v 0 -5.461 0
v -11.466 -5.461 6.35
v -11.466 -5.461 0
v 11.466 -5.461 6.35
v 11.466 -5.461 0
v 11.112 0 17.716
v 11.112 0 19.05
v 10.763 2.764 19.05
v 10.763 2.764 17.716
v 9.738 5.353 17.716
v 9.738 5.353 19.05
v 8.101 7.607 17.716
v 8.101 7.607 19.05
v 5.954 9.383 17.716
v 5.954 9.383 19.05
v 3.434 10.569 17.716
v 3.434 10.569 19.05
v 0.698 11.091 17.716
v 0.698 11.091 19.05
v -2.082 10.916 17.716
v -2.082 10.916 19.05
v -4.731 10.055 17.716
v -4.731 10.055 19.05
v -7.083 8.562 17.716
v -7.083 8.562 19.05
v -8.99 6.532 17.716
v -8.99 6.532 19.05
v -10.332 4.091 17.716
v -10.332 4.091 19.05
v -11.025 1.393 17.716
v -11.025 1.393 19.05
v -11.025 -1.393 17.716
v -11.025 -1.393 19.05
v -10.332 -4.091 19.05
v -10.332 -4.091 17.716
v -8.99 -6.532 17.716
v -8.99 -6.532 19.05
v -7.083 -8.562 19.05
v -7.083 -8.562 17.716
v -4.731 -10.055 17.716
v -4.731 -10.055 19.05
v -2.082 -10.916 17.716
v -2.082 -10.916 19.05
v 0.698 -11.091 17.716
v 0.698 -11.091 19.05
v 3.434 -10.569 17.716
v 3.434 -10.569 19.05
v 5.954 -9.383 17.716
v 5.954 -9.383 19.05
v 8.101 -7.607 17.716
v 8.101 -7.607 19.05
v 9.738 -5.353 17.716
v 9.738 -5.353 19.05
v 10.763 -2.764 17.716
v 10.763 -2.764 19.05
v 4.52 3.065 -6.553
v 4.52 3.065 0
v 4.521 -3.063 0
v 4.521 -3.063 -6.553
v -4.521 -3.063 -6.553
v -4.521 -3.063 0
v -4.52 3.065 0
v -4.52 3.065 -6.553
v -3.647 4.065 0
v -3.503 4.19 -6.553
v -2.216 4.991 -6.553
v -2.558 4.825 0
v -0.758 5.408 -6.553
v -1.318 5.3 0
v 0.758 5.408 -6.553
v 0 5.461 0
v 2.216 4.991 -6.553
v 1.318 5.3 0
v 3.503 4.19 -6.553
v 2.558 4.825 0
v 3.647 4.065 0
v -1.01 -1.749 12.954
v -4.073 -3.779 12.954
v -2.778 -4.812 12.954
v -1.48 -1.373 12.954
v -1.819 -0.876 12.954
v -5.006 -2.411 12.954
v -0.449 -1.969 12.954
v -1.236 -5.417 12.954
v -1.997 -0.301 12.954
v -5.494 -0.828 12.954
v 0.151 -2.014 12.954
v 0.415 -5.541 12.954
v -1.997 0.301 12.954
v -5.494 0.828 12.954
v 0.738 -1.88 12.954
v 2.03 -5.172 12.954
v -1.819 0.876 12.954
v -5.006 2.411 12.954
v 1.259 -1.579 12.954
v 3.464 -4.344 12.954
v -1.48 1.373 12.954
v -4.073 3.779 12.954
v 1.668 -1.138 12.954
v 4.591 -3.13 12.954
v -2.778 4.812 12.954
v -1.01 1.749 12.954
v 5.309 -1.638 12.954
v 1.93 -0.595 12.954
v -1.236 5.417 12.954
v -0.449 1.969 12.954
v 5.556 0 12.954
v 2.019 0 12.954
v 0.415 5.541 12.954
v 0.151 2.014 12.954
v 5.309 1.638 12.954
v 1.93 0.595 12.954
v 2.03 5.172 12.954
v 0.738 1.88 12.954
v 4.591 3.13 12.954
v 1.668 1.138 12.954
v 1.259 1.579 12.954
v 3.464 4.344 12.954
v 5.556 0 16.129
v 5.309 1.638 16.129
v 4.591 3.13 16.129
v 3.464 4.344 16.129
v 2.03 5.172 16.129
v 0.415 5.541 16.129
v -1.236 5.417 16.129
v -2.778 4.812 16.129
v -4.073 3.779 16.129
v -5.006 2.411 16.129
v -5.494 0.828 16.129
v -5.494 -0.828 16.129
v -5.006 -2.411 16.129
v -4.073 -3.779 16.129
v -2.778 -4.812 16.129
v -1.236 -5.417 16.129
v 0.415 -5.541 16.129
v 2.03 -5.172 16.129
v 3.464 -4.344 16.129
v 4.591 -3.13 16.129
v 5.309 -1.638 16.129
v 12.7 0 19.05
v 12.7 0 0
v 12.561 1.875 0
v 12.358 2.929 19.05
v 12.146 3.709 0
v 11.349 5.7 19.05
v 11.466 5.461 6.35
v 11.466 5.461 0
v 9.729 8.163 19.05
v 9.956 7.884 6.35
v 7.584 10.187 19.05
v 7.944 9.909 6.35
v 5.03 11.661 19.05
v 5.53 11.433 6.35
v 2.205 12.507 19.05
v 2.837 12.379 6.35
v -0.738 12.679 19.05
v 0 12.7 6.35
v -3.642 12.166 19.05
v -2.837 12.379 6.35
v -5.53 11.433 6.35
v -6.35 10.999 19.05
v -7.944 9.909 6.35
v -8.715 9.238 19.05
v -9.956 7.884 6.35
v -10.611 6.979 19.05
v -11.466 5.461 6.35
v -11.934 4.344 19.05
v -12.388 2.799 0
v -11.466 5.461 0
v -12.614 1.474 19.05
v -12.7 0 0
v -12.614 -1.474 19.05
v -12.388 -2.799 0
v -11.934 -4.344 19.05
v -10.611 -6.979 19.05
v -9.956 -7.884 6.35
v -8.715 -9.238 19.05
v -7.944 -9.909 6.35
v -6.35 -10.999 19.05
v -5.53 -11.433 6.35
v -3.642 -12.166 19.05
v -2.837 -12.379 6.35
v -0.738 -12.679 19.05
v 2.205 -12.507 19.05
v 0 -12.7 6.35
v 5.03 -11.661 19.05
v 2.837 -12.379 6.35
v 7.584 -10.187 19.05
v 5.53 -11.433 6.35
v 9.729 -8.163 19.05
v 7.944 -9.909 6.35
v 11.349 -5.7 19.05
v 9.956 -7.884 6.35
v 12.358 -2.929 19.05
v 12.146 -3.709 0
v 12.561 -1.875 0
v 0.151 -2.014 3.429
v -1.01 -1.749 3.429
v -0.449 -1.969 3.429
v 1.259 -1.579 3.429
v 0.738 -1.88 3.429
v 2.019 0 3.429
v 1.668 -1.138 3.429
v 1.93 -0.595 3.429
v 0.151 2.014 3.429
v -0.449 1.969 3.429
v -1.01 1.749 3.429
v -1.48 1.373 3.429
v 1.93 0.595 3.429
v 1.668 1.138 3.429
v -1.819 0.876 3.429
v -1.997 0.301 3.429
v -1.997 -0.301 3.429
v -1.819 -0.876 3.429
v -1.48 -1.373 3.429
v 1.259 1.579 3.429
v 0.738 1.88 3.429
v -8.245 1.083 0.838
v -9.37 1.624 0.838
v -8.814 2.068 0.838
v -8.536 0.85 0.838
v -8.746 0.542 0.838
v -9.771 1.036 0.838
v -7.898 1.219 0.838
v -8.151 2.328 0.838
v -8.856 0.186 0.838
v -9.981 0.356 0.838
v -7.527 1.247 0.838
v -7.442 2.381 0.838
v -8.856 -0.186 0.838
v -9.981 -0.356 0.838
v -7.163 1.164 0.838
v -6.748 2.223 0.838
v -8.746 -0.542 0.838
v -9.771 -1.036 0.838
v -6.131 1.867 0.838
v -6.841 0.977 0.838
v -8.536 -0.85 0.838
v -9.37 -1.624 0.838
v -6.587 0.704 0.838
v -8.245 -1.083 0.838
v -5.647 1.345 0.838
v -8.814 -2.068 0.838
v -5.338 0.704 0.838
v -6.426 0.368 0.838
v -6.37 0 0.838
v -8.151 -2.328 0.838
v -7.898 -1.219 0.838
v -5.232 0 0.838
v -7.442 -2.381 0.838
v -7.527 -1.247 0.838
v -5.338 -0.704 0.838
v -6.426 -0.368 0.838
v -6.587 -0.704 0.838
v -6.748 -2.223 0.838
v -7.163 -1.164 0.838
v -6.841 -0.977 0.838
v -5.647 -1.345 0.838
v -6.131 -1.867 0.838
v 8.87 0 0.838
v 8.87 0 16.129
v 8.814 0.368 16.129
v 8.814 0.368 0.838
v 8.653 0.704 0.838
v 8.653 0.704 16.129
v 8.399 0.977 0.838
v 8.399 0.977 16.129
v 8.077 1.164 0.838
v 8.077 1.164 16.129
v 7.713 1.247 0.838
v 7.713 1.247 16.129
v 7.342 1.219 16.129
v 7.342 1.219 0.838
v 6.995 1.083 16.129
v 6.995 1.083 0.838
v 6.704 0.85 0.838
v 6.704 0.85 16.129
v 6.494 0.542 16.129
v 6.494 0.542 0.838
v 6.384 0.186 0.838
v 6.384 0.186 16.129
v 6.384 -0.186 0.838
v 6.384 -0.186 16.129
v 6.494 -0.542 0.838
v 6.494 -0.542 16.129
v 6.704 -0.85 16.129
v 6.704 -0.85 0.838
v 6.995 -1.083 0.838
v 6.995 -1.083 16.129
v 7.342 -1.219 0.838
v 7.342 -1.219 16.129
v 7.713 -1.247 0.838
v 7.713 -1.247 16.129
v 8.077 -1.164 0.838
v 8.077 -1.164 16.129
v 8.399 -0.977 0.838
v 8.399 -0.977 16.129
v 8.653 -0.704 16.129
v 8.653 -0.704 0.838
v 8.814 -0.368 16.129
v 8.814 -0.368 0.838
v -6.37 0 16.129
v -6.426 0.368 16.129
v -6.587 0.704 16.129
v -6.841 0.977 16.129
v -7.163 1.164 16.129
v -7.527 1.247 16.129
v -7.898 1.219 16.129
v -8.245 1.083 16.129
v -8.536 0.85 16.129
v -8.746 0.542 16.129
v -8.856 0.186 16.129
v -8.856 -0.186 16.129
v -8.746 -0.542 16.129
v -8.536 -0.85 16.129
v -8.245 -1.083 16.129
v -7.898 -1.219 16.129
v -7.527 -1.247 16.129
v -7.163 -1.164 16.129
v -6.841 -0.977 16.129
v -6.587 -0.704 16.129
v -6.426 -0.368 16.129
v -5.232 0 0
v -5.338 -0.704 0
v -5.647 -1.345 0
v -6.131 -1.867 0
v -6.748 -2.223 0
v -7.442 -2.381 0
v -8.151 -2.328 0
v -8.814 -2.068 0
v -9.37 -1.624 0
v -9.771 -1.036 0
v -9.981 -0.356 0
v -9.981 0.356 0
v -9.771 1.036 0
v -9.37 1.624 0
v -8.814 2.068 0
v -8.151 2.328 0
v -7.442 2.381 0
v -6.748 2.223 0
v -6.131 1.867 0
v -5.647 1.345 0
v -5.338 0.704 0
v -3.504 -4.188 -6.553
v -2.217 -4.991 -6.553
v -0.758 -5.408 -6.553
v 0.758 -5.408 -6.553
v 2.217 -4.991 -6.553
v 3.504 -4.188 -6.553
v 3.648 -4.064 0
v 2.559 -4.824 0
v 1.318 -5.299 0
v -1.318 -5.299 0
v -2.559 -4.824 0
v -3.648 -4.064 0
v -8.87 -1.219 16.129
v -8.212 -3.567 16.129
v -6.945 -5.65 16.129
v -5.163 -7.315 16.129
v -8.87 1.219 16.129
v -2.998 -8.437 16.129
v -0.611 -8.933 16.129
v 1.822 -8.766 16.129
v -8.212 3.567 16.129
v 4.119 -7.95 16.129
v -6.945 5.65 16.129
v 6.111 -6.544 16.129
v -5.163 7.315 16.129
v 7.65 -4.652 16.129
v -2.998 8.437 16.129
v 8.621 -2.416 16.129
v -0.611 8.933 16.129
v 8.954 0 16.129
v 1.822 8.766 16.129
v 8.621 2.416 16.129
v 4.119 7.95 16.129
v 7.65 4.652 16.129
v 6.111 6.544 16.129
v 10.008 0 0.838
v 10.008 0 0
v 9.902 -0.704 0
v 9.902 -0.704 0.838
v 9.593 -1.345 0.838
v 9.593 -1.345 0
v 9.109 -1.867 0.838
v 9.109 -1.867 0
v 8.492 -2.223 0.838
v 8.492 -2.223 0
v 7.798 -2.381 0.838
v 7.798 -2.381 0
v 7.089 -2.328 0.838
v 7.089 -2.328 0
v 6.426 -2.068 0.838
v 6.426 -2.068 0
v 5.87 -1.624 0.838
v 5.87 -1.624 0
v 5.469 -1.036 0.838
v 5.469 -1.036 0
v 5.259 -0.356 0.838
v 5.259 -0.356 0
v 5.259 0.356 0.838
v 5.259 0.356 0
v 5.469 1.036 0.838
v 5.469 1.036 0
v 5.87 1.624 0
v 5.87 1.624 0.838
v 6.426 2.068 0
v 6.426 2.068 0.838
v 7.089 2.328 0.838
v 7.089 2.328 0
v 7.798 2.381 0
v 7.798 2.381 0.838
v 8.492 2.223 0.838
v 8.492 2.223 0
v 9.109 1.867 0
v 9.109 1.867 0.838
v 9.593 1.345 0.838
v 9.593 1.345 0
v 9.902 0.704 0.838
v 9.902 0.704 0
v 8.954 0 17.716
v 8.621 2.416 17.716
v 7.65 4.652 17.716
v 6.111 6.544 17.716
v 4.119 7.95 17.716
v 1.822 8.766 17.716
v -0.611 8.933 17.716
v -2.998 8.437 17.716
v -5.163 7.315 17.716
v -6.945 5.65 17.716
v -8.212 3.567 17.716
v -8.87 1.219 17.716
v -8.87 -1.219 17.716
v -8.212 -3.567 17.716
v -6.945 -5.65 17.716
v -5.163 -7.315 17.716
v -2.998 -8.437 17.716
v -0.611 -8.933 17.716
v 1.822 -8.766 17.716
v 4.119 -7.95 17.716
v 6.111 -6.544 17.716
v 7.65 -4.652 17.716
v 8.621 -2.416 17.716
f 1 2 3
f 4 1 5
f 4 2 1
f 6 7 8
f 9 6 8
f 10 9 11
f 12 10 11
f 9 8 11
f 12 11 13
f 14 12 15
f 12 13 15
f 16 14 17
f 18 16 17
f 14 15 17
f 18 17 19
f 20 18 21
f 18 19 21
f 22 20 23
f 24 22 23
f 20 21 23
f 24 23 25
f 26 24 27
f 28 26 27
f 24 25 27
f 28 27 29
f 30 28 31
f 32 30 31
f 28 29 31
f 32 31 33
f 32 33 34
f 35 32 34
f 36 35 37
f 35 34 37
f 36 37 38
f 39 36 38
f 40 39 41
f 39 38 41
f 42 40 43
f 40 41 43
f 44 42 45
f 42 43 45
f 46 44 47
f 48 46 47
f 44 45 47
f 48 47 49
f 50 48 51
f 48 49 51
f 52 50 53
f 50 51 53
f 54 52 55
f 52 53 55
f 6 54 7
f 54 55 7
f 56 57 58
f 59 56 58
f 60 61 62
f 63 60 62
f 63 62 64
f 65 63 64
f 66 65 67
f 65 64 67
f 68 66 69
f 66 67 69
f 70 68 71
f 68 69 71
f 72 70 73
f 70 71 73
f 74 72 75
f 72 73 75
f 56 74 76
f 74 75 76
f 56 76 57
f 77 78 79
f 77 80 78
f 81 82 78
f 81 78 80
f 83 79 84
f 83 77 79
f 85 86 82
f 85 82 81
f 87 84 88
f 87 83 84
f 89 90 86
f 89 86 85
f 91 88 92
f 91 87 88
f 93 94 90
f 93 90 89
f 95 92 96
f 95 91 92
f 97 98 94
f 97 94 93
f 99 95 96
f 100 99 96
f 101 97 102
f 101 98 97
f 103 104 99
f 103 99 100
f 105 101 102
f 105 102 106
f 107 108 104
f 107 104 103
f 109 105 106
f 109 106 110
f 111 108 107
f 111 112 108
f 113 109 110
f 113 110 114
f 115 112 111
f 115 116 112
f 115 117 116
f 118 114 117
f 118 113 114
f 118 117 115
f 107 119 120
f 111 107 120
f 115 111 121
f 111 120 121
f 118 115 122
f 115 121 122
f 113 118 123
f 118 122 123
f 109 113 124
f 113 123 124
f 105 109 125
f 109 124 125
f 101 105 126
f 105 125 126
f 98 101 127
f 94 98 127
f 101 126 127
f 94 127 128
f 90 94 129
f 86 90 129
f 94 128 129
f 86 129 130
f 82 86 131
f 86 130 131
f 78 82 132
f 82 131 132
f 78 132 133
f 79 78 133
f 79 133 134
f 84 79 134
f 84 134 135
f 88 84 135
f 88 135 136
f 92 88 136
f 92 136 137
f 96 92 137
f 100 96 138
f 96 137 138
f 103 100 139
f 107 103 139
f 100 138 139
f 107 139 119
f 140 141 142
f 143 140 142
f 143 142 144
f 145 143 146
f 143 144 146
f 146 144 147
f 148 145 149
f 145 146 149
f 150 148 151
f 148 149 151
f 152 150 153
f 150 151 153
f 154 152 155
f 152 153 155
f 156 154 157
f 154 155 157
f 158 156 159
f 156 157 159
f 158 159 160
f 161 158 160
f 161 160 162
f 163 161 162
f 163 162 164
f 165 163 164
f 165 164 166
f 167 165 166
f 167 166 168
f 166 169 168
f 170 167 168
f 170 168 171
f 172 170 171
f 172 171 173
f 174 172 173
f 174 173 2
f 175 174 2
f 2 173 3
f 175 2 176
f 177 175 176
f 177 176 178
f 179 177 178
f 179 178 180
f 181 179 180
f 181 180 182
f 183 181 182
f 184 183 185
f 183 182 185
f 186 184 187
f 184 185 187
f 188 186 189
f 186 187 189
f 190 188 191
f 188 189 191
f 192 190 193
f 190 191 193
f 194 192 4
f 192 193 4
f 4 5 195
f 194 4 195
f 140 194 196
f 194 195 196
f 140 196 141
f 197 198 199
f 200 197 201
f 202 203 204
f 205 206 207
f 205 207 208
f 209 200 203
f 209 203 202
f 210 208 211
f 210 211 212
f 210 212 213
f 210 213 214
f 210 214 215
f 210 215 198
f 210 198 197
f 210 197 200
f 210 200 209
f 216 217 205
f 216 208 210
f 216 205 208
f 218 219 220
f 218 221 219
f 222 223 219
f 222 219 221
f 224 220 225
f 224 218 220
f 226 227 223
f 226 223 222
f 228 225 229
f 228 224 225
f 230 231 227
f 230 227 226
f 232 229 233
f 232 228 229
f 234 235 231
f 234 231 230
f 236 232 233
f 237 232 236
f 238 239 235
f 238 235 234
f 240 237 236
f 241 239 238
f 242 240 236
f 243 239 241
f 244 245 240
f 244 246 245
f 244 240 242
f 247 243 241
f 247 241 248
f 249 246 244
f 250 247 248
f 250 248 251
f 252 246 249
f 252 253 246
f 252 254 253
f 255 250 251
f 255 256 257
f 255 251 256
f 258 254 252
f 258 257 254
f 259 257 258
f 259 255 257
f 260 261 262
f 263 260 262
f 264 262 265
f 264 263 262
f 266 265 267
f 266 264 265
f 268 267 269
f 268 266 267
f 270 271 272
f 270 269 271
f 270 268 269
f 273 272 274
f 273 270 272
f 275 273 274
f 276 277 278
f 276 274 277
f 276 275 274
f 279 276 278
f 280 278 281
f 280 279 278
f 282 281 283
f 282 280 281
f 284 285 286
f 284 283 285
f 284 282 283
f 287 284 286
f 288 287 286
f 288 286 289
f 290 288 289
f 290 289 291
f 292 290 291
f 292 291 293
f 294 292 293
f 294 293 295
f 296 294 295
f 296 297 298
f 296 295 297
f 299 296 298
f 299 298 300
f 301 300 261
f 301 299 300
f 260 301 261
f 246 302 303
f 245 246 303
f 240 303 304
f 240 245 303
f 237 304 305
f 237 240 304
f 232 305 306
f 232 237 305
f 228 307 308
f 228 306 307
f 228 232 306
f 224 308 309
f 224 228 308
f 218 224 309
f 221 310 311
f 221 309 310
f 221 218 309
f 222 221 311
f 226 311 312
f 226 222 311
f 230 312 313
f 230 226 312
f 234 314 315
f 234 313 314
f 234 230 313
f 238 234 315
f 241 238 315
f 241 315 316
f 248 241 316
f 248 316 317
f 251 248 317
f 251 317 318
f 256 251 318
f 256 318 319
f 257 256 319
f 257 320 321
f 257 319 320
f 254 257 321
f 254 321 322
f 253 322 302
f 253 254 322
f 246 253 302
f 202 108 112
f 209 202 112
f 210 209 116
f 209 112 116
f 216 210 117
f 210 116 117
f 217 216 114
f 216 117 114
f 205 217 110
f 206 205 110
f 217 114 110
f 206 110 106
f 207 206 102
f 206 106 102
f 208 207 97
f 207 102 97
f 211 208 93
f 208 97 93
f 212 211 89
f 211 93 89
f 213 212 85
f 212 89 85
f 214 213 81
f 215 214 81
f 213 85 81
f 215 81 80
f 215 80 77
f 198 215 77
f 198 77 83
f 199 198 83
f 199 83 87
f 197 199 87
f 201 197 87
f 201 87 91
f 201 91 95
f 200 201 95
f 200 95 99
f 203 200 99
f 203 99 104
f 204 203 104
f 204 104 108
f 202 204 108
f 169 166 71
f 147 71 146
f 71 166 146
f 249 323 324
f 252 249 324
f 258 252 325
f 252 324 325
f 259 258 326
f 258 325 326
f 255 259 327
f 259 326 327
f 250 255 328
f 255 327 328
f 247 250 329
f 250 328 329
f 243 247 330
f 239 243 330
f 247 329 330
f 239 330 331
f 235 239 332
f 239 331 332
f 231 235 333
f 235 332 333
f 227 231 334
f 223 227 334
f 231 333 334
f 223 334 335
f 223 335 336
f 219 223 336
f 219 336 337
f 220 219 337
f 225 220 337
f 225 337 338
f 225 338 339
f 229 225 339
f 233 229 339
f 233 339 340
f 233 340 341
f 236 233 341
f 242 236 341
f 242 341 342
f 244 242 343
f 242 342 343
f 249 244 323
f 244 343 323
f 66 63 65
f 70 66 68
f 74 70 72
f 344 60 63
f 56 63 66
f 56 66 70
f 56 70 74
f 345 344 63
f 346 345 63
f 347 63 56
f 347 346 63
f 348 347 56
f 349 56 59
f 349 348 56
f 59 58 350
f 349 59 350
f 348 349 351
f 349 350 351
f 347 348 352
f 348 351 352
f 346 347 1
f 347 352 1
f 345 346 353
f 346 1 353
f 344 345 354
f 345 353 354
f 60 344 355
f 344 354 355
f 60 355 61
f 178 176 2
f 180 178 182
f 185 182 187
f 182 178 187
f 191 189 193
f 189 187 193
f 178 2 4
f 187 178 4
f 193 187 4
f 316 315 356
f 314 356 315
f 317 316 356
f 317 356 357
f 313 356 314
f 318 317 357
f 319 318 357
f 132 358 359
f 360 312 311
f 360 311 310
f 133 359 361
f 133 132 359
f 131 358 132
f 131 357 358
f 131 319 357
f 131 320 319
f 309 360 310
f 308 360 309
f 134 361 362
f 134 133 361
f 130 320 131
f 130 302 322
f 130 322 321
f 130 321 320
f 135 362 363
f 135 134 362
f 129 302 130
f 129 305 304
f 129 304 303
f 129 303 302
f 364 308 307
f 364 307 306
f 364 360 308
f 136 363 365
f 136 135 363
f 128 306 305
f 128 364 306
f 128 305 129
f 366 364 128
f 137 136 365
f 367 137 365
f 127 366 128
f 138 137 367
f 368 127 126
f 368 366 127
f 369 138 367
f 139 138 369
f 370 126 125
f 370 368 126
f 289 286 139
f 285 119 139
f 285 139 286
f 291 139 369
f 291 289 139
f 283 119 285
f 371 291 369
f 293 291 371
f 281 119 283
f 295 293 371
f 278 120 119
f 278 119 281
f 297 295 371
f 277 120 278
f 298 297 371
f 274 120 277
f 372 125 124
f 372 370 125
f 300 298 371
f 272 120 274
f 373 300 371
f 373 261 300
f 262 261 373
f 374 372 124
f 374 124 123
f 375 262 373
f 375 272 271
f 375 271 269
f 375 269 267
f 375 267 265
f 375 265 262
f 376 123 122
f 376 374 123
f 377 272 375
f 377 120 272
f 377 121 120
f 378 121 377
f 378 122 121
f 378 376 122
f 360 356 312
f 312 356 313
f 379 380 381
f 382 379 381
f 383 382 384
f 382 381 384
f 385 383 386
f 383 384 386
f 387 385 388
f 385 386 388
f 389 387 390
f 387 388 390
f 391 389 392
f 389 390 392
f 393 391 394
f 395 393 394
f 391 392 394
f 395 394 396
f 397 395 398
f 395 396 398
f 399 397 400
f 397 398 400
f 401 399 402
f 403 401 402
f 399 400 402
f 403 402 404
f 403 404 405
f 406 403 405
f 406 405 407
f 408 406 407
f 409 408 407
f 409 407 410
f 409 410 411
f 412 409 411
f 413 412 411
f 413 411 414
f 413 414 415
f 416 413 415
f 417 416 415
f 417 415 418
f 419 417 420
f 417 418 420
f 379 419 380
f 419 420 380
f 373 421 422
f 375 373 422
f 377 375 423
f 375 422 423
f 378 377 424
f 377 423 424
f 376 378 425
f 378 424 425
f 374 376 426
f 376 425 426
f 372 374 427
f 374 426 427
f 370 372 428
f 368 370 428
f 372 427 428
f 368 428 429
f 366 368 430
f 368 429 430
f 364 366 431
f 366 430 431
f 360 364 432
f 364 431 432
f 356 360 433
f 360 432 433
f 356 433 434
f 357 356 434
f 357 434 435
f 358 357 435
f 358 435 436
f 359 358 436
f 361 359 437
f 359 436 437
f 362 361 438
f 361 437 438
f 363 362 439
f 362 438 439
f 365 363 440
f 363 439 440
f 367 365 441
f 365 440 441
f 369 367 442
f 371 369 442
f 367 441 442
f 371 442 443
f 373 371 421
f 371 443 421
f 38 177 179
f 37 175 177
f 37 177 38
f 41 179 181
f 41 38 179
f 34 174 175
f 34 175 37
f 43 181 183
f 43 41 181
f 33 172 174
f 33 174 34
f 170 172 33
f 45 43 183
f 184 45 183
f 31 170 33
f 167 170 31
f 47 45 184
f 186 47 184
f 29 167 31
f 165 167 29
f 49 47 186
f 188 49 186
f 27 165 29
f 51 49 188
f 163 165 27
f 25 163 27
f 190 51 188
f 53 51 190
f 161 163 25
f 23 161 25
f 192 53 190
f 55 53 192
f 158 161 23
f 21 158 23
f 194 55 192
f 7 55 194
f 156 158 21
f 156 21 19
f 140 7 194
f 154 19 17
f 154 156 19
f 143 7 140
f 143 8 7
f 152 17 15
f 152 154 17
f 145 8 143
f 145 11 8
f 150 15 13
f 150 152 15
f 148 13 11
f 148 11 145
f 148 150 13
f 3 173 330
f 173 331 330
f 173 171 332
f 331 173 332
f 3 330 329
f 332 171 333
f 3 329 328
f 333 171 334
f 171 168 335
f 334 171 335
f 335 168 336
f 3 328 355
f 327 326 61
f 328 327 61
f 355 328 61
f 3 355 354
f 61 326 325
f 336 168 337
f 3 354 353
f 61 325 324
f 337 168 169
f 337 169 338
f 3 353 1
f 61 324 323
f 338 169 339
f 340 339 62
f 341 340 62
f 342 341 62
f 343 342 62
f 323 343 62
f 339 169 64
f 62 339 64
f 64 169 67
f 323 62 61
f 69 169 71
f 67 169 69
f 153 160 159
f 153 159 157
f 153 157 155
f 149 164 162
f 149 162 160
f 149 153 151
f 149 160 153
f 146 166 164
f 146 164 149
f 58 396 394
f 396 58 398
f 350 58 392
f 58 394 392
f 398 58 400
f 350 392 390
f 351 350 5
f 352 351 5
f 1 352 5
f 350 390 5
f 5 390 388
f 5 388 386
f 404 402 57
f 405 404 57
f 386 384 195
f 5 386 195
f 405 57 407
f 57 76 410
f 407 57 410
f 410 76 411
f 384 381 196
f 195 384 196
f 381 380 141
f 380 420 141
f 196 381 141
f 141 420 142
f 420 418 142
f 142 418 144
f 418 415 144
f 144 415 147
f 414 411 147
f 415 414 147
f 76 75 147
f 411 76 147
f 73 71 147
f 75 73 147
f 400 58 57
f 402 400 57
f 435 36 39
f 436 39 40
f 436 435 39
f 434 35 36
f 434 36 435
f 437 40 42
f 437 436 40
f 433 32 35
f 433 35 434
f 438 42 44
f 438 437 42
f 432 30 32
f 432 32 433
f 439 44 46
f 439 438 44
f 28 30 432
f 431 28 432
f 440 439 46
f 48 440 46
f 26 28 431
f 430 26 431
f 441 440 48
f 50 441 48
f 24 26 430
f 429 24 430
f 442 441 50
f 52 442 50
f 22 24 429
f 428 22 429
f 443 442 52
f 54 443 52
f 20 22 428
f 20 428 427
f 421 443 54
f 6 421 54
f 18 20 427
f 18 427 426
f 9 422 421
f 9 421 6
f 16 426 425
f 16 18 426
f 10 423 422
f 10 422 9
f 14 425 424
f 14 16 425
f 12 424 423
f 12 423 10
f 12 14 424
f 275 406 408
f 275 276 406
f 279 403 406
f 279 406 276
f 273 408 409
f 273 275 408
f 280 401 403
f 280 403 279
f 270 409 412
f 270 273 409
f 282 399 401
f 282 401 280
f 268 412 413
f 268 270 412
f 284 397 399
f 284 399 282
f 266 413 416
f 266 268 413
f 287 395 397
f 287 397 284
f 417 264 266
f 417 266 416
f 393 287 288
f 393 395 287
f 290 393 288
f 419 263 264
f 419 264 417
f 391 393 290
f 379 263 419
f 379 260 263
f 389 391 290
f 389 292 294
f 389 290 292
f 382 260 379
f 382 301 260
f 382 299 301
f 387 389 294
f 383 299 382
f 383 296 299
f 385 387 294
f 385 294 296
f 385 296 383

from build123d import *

# Parameters (mm, degrees)
F0_R      = 12.7
F0_R_2    = 1.25
F1_DEPTH  = 19.05
F2_R      = 11.1125
F3_DEPTH  = 1.3335
F4_R      = 8.9535
F5_DEPTH  = 1.5875
F6_R      = 2.3876
F6_R_2    = 1.25
F7_DEPTH  = 0.8382
F9_DEPTH  = 6.5532
F10_R     = 2.0193
F11_DEPTH = 12.7
F12_R     = 5.55625
F13_DEPTH = 3.175
F15_W     = 32.121103
F15_H     = 6.35
F16_DEPTH = 25.4
F18_W     = 29.637642
F18_H     = 6.35
F19_DEPTH = 25.4


with BuildPart() as f1:
    # F0 (on Top) → F1 (new body)
    with BuildSketch(Plane.XY):
        Circle(F0_R)
        with Locations((-7.62, 0)):
            Circle(F0_R_2, mode=Mode.SUBTRACT)
        with Locations((7.62, 0)):
            Circle(F0_R_2, mode=Mode.SUBTRACT)
    extrude(amount=F1_DEPTH)

    # F2 (on face) → F3 (cut)
    with BuildSketch(Plane.XY.offset(19.05)):
        Circle(F2_R)
    extrude(amount=-F3_DEPTH, mode=Mode.SUBTRACT)

    # F4 (on face) → F5 (cut)
    with BuildSketch(Plane.XY.offset(17.7165)):
        Circle(F4_R)
    extrude(amount=-F5_DEPTH, mode=Mode.SUBTRACT)

    # F6 (on face) → F7 (cut)
    with BuildSketch(Plane(origin=(0, 0, 0), x_dir=(1, 0, 0), z_dir=(0, 0, -1))):
        with Locations((-7.62, 0)):
            Circle(F6_R)
        with Locations((-7.62, 0)):
            Circle(F6_R_2, mode=Mode.SUBTRACT)
        with Locations((7.62, 0)):
            Circle(F6_R)
        with Locations((7.62, 0)):
            Circle(F6_R_2, mode=Mode.SUBTRACT)
    extrude(amount=-F7_DEPTH, mode=Mode.SUBTRACT)

    # F8 (on face) → F9 (join)
    with BuildSketch(Plane(origin=(0, 0, 0), x_dir=(1, 0, 0), z_dir=(0, 0, -1))):
        with BuildLine():
            Line((-4.5212, 3.062886), (-4.519813, -3.064932))
            ThreePointArc((-4.519813, -3.064932), (0, -5.461), (4.519813, -3.064932))
            Line((4.519813, -3.064932), (4.5212, 3.062886))
            ThreePointArc((4.5212, 3.062886), (0, 5.461), (-4.5212, 3.062886))
        make_face()
    extrude(amount=F9_DEPTH)

    # F10 (on face) → F11 (cut)
    with BuildSketch(Plane.XY.offset(16.129)):
        Circle(F10_R)
    extrude(amount=-F11_DEPTH, mode=Mode.SUBTRACT)

    # F12 (on face) → F13 (cut)
    with BuildSketch(Plane.XY.offset(16.129)):
        Circle(F12_R)
    extrude(amount=-F13_DEPTH, mode=Mode.SUBTRACT)

    # F15 (on offset) → F16 (cut)
    with BuildSketch(Plane.XZ.offset(5.461)):
        with Locations((-0.362548, 3.175)):
            Rectangle(F15_W, F15_H)
    extrude(amount=F16_DEPTH, mode=Mode.SUBTRACT)

    # F18 (on offset) → F19 (cut)
    with BuildSketch(Plane.XZ.offset(-5.461)):
        with Locations((-0.89105, 3.175)):
            Rectangle(F18_W, F18_H)
    extrude(amount=-F19_DEPTH, mode=Mode.SUBTRACT)


solid = f1.part
